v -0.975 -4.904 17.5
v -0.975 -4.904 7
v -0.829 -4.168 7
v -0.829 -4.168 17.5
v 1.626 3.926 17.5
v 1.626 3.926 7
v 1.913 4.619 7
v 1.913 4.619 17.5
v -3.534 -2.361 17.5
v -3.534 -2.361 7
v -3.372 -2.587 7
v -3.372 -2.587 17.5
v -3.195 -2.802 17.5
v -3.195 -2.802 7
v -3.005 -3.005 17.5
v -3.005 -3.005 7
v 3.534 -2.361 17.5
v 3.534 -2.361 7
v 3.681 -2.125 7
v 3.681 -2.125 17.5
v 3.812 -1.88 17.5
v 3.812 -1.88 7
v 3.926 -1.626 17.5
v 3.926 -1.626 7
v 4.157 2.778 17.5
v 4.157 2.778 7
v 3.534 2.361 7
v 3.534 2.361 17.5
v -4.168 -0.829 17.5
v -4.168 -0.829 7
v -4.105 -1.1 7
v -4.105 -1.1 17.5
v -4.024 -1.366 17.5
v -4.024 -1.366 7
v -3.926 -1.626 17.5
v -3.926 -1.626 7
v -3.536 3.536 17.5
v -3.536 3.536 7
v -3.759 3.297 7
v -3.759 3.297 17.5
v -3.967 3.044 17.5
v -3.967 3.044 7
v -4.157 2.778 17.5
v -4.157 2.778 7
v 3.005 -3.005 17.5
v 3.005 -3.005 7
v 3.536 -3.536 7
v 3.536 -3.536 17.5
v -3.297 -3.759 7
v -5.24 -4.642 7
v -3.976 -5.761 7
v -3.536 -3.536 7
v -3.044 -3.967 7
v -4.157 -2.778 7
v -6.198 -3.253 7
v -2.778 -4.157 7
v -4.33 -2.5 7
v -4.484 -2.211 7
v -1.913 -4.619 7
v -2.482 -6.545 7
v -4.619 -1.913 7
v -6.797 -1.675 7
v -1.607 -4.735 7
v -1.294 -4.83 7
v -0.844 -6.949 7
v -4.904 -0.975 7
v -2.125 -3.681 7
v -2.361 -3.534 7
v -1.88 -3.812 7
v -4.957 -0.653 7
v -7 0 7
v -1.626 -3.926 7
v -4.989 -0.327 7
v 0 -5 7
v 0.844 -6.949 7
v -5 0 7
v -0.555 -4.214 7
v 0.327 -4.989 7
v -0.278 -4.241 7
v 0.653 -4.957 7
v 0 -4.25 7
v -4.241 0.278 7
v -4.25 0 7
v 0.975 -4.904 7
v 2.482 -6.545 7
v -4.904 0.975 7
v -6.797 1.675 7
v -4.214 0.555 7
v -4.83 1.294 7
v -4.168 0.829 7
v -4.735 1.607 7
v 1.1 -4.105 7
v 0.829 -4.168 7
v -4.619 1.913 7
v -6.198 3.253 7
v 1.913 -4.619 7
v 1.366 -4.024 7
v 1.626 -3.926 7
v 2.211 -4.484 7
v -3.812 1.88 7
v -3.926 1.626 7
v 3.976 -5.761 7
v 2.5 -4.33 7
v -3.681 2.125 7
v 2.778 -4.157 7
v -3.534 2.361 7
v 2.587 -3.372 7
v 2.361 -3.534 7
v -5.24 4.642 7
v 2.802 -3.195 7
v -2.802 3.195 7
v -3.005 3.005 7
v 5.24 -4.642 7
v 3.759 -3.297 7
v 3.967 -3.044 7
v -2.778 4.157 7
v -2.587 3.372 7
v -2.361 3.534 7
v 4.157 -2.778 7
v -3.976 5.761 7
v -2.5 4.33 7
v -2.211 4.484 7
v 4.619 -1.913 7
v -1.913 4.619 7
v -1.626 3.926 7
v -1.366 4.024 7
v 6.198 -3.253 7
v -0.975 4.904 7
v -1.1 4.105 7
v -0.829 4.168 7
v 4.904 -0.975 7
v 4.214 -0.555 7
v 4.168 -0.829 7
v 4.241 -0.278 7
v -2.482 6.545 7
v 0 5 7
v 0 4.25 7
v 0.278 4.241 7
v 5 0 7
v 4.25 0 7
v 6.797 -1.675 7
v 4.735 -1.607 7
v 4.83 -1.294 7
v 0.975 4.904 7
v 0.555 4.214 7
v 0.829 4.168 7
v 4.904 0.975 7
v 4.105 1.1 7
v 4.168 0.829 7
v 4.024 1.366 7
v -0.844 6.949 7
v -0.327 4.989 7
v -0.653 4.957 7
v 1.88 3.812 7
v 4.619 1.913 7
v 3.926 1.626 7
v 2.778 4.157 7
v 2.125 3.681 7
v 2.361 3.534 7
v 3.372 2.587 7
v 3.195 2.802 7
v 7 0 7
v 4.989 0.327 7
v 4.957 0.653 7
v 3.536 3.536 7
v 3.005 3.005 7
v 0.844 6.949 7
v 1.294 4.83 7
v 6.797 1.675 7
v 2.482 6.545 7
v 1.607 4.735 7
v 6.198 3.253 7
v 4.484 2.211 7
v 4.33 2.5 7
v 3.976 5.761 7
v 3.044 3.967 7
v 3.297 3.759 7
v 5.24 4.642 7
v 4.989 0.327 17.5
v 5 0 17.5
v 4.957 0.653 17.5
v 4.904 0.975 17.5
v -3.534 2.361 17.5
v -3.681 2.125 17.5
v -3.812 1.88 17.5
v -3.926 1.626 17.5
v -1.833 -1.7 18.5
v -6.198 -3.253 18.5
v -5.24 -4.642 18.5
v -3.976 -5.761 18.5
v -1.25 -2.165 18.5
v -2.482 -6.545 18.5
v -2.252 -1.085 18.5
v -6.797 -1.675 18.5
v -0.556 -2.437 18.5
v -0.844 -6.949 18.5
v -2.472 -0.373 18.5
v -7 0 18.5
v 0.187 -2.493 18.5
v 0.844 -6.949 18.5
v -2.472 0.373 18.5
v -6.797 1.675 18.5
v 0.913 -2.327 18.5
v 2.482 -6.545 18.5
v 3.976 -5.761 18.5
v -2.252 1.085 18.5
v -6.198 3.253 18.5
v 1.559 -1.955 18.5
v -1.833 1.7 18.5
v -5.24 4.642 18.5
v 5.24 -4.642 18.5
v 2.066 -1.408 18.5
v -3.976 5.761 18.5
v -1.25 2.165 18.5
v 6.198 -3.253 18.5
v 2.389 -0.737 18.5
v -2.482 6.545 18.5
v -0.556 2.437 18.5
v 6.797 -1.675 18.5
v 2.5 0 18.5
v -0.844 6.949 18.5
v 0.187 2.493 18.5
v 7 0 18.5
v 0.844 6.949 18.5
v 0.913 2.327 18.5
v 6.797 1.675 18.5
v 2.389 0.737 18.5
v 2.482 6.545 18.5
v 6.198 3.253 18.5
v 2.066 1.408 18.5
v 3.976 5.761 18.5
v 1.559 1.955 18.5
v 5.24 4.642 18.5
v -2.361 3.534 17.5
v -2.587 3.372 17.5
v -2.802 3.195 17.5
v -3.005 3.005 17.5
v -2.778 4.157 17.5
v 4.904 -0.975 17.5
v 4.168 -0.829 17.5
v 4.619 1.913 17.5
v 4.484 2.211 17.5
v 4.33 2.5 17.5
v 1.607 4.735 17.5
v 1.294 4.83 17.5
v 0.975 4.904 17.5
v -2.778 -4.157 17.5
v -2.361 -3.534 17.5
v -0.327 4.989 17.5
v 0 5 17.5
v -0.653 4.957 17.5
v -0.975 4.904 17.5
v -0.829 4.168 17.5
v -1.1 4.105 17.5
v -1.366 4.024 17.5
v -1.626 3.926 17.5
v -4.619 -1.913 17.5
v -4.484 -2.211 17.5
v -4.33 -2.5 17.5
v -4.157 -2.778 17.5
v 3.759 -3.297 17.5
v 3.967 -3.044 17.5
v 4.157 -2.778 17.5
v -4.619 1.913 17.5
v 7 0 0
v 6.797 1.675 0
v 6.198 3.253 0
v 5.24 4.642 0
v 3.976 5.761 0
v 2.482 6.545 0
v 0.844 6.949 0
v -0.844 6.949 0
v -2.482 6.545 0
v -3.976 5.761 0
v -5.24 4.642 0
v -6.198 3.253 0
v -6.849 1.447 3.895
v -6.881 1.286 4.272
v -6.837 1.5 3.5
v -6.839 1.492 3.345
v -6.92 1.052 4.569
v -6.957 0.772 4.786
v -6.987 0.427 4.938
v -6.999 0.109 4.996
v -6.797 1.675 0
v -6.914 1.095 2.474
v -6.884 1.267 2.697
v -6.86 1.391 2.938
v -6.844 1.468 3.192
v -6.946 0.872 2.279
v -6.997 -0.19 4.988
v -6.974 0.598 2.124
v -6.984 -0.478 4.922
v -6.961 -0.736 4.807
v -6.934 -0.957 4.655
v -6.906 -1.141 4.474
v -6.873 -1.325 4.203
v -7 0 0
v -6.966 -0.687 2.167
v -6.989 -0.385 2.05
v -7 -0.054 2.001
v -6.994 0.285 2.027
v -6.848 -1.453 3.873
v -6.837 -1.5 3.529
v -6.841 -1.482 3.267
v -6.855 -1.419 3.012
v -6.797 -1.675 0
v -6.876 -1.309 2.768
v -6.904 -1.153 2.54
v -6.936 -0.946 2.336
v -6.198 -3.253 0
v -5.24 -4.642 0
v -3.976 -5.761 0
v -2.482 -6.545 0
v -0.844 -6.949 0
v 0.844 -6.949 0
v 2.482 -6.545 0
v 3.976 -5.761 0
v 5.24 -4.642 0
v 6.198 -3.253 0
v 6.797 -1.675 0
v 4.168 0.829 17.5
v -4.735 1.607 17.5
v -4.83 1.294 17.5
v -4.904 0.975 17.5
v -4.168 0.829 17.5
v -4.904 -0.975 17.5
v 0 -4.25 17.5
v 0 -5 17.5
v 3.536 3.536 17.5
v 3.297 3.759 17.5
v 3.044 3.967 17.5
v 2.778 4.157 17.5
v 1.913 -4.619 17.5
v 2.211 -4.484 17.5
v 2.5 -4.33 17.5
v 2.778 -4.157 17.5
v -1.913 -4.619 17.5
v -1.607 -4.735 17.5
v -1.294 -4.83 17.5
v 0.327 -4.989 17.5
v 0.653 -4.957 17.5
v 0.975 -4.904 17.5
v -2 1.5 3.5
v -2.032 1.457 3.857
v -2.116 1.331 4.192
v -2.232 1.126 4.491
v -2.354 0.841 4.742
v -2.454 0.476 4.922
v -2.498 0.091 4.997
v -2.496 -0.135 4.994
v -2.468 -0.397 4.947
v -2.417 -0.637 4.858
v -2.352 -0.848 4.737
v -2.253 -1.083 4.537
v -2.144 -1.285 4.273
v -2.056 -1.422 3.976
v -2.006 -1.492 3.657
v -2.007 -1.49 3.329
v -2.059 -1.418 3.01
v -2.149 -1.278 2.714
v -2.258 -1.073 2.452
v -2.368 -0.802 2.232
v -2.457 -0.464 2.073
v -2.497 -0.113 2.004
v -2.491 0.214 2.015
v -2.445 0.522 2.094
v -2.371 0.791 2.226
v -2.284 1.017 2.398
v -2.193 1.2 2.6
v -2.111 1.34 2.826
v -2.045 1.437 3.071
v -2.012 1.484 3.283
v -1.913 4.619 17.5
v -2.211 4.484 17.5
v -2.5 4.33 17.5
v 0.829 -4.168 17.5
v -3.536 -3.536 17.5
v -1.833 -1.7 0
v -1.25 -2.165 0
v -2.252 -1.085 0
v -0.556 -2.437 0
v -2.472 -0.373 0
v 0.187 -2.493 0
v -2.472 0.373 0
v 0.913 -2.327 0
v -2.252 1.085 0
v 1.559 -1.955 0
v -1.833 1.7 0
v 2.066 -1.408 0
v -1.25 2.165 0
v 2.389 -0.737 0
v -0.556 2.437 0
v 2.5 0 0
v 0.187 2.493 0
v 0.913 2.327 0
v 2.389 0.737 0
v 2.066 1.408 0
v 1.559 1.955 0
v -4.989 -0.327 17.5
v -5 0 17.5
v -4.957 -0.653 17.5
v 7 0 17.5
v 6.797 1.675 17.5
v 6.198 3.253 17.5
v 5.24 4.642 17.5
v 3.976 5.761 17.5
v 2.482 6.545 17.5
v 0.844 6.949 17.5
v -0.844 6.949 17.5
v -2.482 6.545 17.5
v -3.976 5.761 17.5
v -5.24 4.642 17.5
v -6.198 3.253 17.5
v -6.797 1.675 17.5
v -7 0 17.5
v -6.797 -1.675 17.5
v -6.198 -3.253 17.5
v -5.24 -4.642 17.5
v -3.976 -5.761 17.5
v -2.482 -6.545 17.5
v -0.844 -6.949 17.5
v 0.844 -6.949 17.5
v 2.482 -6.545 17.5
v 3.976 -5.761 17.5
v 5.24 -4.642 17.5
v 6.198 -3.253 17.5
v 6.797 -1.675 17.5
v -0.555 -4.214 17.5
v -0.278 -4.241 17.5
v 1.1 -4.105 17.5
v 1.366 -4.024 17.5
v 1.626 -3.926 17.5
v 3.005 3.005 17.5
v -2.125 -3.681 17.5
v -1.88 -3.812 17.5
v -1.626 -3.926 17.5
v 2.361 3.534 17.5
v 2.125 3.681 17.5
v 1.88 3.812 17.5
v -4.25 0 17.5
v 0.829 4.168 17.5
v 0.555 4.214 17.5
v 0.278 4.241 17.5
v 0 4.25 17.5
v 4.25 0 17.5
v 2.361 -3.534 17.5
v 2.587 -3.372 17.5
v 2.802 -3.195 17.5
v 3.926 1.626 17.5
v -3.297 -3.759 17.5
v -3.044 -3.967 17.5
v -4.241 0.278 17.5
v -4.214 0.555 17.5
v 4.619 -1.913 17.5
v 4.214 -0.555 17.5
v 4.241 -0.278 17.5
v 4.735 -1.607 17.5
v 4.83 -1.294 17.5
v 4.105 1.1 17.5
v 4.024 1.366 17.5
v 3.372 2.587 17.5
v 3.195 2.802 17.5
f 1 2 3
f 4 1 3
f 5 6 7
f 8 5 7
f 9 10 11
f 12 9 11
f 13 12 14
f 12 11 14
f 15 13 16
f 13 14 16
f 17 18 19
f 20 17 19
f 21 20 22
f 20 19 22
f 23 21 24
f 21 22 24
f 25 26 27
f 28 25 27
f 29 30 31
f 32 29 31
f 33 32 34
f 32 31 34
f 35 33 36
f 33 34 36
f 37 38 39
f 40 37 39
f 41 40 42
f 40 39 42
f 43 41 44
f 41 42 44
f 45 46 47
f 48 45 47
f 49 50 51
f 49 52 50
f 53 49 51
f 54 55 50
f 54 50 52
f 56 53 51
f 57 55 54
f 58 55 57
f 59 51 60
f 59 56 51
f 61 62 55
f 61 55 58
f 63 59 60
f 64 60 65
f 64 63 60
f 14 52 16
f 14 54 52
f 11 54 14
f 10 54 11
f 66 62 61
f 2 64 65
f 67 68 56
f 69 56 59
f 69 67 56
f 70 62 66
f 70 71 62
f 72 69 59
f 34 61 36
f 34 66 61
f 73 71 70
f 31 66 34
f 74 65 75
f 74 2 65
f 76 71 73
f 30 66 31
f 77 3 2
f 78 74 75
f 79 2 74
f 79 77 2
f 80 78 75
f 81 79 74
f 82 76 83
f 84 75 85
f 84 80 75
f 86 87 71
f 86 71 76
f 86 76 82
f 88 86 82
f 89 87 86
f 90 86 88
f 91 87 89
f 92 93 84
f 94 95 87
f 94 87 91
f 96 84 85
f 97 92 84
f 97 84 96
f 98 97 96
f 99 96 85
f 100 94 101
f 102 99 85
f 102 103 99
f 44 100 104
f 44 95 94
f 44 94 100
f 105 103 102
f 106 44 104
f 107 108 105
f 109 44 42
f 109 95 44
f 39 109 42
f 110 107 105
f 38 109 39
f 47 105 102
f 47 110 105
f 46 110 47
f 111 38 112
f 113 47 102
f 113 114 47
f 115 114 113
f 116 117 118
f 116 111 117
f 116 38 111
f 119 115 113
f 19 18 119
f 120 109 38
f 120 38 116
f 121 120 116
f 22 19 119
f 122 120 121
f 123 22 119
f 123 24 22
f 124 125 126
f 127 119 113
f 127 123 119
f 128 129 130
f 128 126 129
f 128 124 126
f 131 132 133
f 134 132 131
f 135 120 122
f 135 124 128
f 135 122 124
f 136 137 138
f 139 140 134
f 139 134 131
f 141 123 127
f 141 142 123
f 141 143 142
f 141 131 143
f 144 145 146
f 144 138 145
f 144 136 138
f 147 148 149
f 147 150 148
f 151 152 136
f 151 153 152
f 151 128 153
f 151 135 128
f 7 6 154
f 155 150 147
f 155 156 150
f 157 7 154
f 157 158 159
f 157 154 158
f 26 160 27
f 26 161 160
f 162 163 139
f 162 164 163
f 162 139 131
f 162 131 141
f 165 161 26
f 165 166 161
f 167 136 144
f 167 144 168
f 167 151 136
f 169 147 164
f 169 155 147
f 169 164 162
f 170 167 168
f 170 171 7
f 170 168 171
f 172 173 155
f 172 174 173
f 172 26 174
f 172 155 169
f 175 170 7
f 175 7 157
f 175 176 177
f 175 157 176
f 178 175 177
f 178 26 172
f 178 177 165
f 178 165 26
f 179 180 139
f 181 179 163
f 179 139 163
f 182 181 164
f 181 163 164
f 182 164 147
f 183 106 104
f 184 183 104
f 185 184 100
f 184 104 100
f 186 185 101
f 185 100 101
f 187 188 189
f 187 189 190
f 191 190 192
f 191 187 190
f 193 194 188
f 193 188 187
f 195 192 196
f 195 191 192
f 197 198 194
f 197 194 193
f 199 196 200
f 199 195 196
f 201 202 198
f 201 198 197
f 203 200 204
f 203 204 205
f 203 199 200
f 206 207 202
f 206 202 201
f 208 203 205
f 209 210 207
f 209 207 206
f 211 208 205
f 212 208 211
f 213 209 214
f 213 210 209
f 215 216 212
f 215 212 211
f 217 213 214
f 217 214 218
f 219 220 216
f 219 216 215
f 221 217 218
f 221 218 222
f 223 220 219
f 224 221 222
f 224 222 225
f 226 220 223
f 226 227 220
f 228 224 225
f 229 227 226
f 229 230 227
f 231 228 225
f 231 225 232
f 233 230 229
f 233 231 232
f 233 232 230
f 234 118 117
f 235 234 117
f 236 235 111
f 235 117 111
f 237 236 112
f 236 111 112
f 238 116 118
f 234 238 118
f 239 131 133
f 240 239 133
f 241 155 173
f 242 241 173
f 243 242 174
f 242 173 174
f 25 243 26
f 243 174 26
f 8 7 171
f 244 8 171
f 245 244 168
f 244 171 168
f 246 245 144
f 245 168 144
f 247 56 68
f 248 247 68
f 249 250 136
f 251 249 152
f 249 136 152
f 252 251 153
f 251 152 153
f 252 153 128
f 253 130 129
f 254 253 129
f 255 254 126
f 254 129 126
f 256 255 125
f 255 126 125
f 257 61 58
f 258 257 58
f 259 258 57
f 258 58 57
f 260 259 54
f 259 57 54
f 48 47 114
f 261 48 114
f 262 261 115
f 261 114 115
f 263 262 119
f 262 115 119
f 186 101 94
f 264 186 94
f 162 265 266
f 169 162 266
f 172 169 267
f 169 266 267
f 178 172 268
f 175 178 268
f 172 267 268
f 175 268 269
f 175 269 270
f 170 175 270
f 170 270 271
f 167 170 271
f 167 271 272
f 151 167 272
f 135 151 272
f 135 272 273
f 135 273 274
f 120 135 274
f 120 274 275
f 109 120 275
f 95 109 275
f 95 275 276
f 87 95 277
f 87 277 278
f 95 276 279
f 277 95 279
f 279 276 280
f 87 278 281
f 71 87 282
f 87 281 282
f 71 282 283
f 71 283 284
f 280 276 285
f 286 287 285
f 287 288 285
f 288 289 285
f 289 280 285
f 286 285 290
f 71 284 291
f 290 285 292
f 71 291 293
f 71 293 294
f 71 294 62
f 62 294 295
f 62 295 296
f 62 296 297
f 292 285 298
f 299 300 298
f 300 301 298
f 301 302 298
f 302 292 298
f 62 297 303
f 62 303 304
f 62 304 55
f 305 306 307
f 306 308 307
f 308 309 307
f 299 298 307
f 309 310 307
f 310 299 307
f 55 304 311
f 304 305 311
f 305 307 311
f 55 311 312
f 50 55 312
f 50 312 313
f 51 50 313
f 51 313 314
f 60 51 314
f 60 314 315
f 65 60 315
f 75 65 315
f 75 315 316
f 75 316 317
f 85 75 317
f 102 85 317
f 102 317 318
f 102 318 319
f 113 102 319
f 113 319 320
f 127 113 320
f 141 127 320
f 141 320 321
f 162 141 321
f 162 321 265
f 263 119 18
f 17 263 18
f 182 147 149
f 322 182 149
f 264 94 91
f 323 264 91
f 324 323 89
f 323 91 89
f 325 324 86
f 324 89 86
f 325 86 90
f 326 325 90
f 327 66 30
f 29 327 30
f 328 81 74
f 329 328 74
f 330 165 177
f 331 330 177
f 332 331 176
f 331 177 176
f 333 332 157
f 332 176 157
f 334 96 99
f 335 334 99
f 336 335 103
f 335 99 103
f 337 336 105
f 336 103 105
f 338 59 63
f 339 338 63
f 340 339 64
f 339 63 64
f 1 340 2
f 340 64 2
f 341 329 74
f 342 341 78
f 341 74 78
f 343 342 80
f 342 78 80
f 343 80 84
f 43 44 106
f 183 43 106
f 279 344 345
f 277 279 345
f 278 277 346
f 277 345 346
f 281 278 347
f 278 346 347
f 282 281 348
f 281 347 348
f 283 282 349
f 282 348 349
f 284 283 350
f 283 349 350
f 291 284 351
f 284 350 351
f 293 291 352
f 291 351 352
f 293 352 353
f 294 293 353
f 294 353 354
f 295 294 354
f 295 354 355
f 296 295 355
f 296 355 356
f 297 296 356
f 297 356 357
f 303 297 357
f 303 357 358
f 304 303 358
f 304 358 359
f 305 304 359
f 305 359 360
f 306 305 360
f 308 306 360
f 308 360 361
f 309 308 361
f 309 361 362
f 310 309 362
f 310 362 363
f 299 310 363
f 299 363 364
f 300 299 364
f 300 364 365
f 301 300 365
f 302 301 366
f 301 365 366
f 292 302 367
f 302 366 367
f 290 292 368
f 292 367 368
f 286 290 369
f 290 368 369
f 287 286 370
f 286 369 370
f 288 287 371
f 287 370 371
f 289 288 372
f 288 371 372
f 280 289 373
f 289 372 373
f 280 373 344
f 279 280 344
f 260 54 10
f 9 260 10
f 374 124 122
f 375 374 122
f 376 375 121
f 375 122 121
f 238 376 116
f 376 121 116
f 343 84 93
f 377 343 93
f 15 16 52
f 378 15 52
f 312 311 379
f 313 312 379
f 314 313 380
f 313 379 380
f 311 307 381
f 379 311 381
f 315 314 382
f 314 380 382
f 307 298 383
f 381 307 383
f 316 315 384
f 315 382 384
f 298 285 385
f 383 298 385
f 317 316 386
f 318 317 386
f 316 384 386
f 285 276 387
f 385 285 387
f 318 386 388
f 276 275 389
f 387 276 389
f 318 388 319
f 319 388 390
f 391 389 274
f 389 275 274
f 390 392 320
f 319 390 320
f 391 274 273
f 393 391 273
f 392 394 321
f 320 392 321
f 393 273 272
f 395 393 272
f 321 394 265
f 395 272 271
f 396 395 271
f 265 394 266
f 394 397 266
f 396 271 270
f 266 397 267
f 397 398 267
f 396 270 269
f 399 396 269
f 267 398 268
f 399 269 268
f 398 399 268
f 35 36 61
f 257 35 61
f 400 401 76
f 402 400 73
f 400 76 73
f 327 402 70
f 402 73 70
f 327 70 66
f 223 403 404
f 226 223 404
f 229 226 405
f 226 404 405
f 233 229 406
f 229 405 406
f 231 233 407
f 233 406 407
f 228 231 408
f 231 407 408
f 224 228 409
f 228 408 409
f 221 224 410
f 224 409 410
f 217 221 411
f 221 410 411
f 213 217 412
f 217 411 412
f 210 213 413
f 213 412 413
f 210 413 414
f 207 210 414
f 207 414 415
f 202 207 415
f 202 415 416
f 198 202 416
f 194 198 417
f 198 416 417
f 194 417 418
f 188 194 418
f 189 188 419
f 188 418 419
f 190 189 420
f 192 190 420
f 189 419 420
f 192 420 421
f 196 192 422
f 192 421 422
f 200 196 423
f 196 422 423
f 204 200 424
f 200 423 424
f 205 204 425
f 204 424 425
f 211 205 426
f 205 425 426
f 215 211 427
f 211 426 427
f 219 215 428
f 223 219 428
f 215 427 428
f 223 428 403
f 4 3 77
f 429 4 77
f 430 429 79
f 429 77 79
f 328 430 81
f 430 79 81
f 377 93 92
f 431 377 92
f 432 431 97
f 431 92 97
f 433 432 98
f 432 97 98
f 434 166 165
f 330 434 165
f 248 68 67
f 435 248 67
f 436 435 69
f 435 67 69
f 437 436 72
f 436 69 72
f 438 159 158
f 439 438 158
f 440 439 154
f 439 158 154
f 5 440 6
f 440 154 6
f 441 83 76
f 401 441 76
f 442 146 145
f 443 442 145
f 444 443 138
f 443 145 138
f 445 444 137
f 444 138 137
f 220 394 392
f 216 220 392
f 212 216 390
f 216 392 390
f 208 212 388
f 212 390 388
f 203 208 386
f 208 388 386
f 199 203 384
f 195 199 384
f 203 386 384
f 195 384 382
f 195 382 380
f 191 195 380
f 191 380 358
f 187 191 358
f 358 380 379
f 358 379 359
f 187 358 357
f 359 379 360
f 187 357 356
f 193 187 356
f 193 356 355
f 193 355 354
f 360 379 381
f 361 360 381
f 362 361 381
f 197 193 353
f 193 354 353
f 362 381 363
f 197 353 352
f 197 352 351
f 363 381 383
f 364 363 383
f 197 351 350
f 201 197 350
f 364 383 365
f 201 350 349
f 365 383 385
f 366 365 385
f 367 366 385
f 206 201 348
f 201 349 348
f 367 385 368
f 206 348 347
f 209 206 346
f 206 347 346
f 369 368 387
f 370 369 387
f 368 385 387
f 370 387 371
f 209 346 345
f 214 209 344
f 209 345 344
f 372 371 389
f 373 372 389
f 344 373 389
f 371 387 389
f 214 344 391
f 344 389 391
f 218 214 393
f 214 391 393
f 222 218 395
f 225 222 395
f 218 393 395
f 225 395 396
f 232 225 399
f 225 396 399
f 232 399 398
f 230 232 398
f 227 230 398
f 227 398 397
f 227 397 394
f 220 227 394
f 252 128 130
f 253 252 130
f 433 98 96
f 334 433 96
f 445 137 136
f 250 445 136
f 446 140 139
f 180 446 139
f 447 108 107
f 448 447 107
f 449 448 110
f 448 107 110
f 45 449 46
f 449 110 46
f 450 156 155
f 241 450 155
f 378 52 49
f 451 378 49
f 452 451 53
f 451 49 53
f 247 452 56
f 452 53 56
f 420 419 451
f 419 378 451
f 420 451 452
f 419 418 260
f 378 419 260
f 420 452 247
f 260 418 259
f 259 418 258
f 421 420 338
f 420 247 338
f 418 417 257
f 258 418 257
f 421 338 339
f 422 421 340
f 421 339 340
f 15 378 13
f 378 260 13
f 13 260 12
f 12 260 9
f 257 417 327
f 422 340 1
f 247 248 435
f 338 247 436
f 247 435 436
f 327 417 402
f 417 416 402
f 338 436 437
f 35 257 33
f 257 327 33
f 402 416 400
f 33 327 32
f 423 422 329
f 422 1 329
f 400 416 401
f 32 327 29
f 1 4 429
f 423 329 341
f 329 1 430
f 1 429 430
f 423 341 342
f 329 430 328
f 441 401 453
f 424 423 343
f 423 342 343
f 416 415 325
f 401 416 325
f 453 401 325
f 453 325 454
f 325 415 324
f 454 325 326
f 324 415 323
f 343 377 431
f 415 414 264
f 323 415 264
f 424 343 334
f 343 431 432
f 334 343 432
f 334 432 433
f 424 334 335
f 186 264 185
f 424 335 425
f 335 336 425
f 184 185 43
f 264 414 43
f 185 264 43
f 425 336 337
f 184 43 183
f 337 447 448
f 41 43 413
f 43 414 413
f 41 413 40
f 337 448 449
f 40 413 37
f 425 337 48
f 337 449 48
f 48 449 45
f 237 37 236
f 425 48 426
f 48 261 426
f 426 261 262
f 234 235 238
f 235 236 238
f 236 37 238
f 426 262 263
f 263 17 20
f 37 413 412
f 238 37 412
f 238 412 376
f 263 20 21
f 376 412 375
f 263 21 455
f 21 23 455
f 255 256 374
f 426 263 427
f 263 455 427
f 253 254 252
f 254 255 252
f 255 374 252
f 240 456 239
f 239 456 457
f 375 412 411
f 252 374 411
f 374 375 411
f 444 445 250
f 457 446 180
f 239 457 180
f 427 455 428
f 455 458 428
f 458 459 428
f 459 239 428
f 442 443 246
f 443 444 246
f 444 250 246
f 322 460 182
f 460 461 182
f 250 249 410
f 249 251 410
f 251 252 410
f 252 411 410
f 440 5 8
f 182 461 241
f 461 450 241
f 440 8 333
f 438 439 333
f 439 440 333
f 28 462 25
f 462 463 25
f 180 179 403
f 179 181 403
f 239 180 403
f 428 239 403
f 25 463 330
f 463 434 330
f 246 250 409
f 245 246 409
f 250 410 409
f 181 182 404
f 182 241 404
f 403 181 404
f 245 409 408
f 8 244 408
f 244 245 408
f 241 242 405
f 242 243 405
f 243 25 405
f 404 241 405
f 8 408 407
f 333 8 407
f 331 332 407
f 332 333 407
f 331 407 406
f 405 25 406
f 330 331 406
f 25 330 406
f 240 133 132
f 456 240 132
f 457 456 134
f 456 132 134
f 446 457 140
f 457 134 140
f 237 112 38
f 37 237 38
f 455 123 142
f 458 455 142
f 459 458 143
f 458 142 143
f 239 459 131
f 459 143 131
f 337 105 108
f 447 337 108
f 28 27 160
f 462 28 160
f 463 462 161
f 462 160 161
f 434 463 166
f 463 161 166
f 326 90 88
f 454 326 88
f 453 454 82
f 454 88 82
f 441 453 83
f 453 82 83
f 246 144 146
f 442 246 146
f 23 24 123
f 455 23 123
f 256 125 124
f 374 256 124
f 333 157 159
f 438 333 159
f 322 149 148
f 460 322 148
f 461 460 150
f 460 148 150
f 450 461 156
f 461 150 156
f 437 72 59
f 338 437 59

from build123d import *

# Parameters (mm, degrees)
F0_R     = 7
F1_DEPTH = 7
F3_DEPTH = 10.5
F4_R     = 7
F5_DEPTH = 1
F6_R     = 2.5
F7_DEPTH = 18.501
F8_R     = 1.5
F9_DEPTH = 25


with BuildPart() as f1:
    # F0 (on Top) → F1 (new body)
    with BuildSketch(Plane.XY):
        Circle(F0_R)
    extrude(amount=F1_DEPTH)

    # F2 (on face) → F3 (join)
    with BuildSketch(Plane.XY.offset(7)):
        with BuildLine():
            ThreePointArc((0.829134, 4.168337), (0.416573, 4.229535), (0, 4.25))
            Line((0, 4.25), (0, 5))
            ThreePointArc((0, 5), (-0.490086, 4.975924), (-0.975452, 4.903926))
            Line((-0.975452, 4.903926), (-0.829134, 4.168337))
            ThreePointArc((-0.829134, 4.168337), (-1.23371, 4.066996), (-1.626405, 3.926488))
            Line((-1.626405, 3.926488), (-1.913417, 4.619398))
            ThreePointArc((-1.913417, 4.619398), (-2.356984, 4.409606), (-2.777851, 4.157348))
            Line((-2.777851, 4.157348), (-2.361173, 3.533746))
            ThreePointArc((-2.361173, 3.533746), (-2.696171, 3.285294), (-3.005204, 3.005204))
            Line((-3.005204, 3.005204), (-3.535534, 3.535534))
            ThreePointArc((-3.535534, 3.535534), (-3.865052, 3.171966), (-4.157348, 2.777851))
            Line((-4.157348, 2.777851), (-3.533746, 2.361173))
            ThreePointArc((-3.533746, 2.361173), (-3.748165, 2.003436), (-3.926488, 1.626405))
            Line((-3.926488, 1.626405), (-4.619398, 1.913417))
            ThreePointArc((-4.619398, 1.913417), (-4.784702, 1.451423), (-4.903926, 0.975452))
            Line((-4.903926, 0.975452), (-4.168337, 0.829134))
            ThreePointArc((-4.168337, 0.829134), (-4.229535, 0.416573), (-4.25, 0))
            Line((-4.25, 0), (-5, 0))
            ThreePointArc((-5, 0), (-4.975924, -0.490086), (-4.903926, -0.975452))
            Line((-4.903926, -0.975452), (-4.168337, -0.829134))
            ThreePointArc((-4.168337, -0.829134), (-4.066996, -1.23371), (-3.926488, -1.626405))
            Line((-3.926488, -1.626405), (-4.619398, -1.913417))
            ThreePointArc((-4.619398, -1.913417), (-4.409606, -2.356984), (-4.157348, -2.777851))
            Line((-4.157348, -2.777851), (-3.533746, -2.361173))
            ThreePointArc((-3.533746, -2.361173), (-3.285294, -2.696171), (-3.005204, -3.005204))
            Line((-3.005204, -3.005204), (-3.535534, -3.535534))
            ThreePointArc((-3.535534, -3.535534), (-3.171966, -3.865052), (-2.777851, -4.157348))
            Line((-2.777851, -4.157348), (-2.361173, -3.533746))
            ThreePointArc((-2.361173, -3.533746), (-2.003436, -3.748165), (-1.626405, -3.926488))
            Line((-1.626405, -3.926488), (-1.913417, -4.619398))
            ThreePointArc((-1.913417, -4.619398), (-1.451423, -4.784702), (-0.975452, -4.903926))
            Line((-0.975452, -4.903926), (-0.829134, -4.168337))
            ThreePointArc((-0.829134, -4.168337), (-0.416573, -4.229535), (0, -4.25))
            Line((0, -4.25), (0, -5))
            ThreePointArc((0, -5), (0.490086, -4.975924), (0.975452, -4.903926))
            Line((0.975452, -4.903926), (0.829134, -4.168337))
            ThreePointArc((0.829134, -4.168337), (1.23371, -4.066996), (1.626405, -3.926488))
            Line((1.626405, -3.926488), (1.913417, -4.619398))
            ThreePointArc((1.913417, -4.619398), (2.356984, -4.409606), (2.777851, -4.157348))
            Line((2.777851, -4.157348), (2.361173, -3.533746))
            ThreePointArc((2.361173, -3.533746), (2.696171, -3.285294), (3.005204, -3.005204))
            Line((3.005204, -3.005204), (3.535534, -3.535534))
            ThreePointArc((3.535534, -3.535534), (3.865052, -3.171966), (4.157348, -2.777851))
            Line((4.157348, -2.777851), (3.533746, -2.361173))
            ThreePointArc((3.533746, -2.361173), (3.748165, -2.003436), (3.926488, -1.626405))
            Line((3.926488, -1.626405), (4.619398, -1.913417))
            ThreePointArc((4.619398, -1.913417), (4.784702, -1.451423), (4.903926, -0.975452))
            Line((4.903926, -0.975452), (4.168337, -0.829134))
            ThreePointArc((4.168337, -0.829134), (4.229535, -0.416573), (4.25, 0))
            Line((4.25, 0), (5, 0))
            ThreePointArc((5, 0), (4.975924, 0.490086), (4.903926, 0.975452))
            Line((4.903926, 0.975452), (4.168337, 0.829134))
            ThreePointArc((4.168337, 0.829134), (4.066996, 1.23371), (3.926488, 1.626405))
            Line((3.926488, 1.626405), (4.619398, 1.913417))
            ThreePointArc((4.619398, 1.913417), (4.409606, 2.356984), (4.157348, 2.777851))
            Line((4.157348, 2.777851), (3.533746, 2.361173))
            ThreePointArc((3.533746, 2.361173), (3.285294, 2.696171), (3.005204, 3.005204))
            Line((3.005204, 3.005204), (3.535534, 3.535534))
            ThreePointArc((3.535534, 3.535534), (3.171966, 3.865052), (2.777851, 4.157348))
            Line((2.777851, 4.157348), (2.361173, 3.533746))
            ThreePointArc((2.361173, 3.533746), (2.003436, 3.748165), (1.626405, 3.926488))
            Line((1.626405, 3.926488), (1.913417, 4.619398))
            ThreePointArc((1.913417, 4.619398), (1.451423, 4.784702), (0.975452, 4.903926))
            Line((0.975452, 4.903926), (0.829134, 4.168337))
        make_face()
    extrude(amount=F3_DEPTH)

    # F4 (on face) → F5 (join)
    with BuildSketch(Plane.XY.offset(17.5)):
        Circle(F4_R)
    extrude(amount=F5_DEPTH)

    # F6 (on face) → F7 (cut, through all)
    with BuildSketch(Plane(origin=(0, 0, 0), x_dir=(1, 0, 0), z_dir=(0, 0, -1))):
        Circle(F6_R)
    extrude(amount=-F7_DEPTH, mode=Mode.SUBTRACT)

    # F8 (on Right) → F9 (cut)
    with BuildSketch(Plane.YZ):
        with Locations((0, 3.5)):
            Circle(F8_R)
    extrude(amount=-F9_DEPTH, mode=Mode.SUBTRACT)


solid = f1.part
